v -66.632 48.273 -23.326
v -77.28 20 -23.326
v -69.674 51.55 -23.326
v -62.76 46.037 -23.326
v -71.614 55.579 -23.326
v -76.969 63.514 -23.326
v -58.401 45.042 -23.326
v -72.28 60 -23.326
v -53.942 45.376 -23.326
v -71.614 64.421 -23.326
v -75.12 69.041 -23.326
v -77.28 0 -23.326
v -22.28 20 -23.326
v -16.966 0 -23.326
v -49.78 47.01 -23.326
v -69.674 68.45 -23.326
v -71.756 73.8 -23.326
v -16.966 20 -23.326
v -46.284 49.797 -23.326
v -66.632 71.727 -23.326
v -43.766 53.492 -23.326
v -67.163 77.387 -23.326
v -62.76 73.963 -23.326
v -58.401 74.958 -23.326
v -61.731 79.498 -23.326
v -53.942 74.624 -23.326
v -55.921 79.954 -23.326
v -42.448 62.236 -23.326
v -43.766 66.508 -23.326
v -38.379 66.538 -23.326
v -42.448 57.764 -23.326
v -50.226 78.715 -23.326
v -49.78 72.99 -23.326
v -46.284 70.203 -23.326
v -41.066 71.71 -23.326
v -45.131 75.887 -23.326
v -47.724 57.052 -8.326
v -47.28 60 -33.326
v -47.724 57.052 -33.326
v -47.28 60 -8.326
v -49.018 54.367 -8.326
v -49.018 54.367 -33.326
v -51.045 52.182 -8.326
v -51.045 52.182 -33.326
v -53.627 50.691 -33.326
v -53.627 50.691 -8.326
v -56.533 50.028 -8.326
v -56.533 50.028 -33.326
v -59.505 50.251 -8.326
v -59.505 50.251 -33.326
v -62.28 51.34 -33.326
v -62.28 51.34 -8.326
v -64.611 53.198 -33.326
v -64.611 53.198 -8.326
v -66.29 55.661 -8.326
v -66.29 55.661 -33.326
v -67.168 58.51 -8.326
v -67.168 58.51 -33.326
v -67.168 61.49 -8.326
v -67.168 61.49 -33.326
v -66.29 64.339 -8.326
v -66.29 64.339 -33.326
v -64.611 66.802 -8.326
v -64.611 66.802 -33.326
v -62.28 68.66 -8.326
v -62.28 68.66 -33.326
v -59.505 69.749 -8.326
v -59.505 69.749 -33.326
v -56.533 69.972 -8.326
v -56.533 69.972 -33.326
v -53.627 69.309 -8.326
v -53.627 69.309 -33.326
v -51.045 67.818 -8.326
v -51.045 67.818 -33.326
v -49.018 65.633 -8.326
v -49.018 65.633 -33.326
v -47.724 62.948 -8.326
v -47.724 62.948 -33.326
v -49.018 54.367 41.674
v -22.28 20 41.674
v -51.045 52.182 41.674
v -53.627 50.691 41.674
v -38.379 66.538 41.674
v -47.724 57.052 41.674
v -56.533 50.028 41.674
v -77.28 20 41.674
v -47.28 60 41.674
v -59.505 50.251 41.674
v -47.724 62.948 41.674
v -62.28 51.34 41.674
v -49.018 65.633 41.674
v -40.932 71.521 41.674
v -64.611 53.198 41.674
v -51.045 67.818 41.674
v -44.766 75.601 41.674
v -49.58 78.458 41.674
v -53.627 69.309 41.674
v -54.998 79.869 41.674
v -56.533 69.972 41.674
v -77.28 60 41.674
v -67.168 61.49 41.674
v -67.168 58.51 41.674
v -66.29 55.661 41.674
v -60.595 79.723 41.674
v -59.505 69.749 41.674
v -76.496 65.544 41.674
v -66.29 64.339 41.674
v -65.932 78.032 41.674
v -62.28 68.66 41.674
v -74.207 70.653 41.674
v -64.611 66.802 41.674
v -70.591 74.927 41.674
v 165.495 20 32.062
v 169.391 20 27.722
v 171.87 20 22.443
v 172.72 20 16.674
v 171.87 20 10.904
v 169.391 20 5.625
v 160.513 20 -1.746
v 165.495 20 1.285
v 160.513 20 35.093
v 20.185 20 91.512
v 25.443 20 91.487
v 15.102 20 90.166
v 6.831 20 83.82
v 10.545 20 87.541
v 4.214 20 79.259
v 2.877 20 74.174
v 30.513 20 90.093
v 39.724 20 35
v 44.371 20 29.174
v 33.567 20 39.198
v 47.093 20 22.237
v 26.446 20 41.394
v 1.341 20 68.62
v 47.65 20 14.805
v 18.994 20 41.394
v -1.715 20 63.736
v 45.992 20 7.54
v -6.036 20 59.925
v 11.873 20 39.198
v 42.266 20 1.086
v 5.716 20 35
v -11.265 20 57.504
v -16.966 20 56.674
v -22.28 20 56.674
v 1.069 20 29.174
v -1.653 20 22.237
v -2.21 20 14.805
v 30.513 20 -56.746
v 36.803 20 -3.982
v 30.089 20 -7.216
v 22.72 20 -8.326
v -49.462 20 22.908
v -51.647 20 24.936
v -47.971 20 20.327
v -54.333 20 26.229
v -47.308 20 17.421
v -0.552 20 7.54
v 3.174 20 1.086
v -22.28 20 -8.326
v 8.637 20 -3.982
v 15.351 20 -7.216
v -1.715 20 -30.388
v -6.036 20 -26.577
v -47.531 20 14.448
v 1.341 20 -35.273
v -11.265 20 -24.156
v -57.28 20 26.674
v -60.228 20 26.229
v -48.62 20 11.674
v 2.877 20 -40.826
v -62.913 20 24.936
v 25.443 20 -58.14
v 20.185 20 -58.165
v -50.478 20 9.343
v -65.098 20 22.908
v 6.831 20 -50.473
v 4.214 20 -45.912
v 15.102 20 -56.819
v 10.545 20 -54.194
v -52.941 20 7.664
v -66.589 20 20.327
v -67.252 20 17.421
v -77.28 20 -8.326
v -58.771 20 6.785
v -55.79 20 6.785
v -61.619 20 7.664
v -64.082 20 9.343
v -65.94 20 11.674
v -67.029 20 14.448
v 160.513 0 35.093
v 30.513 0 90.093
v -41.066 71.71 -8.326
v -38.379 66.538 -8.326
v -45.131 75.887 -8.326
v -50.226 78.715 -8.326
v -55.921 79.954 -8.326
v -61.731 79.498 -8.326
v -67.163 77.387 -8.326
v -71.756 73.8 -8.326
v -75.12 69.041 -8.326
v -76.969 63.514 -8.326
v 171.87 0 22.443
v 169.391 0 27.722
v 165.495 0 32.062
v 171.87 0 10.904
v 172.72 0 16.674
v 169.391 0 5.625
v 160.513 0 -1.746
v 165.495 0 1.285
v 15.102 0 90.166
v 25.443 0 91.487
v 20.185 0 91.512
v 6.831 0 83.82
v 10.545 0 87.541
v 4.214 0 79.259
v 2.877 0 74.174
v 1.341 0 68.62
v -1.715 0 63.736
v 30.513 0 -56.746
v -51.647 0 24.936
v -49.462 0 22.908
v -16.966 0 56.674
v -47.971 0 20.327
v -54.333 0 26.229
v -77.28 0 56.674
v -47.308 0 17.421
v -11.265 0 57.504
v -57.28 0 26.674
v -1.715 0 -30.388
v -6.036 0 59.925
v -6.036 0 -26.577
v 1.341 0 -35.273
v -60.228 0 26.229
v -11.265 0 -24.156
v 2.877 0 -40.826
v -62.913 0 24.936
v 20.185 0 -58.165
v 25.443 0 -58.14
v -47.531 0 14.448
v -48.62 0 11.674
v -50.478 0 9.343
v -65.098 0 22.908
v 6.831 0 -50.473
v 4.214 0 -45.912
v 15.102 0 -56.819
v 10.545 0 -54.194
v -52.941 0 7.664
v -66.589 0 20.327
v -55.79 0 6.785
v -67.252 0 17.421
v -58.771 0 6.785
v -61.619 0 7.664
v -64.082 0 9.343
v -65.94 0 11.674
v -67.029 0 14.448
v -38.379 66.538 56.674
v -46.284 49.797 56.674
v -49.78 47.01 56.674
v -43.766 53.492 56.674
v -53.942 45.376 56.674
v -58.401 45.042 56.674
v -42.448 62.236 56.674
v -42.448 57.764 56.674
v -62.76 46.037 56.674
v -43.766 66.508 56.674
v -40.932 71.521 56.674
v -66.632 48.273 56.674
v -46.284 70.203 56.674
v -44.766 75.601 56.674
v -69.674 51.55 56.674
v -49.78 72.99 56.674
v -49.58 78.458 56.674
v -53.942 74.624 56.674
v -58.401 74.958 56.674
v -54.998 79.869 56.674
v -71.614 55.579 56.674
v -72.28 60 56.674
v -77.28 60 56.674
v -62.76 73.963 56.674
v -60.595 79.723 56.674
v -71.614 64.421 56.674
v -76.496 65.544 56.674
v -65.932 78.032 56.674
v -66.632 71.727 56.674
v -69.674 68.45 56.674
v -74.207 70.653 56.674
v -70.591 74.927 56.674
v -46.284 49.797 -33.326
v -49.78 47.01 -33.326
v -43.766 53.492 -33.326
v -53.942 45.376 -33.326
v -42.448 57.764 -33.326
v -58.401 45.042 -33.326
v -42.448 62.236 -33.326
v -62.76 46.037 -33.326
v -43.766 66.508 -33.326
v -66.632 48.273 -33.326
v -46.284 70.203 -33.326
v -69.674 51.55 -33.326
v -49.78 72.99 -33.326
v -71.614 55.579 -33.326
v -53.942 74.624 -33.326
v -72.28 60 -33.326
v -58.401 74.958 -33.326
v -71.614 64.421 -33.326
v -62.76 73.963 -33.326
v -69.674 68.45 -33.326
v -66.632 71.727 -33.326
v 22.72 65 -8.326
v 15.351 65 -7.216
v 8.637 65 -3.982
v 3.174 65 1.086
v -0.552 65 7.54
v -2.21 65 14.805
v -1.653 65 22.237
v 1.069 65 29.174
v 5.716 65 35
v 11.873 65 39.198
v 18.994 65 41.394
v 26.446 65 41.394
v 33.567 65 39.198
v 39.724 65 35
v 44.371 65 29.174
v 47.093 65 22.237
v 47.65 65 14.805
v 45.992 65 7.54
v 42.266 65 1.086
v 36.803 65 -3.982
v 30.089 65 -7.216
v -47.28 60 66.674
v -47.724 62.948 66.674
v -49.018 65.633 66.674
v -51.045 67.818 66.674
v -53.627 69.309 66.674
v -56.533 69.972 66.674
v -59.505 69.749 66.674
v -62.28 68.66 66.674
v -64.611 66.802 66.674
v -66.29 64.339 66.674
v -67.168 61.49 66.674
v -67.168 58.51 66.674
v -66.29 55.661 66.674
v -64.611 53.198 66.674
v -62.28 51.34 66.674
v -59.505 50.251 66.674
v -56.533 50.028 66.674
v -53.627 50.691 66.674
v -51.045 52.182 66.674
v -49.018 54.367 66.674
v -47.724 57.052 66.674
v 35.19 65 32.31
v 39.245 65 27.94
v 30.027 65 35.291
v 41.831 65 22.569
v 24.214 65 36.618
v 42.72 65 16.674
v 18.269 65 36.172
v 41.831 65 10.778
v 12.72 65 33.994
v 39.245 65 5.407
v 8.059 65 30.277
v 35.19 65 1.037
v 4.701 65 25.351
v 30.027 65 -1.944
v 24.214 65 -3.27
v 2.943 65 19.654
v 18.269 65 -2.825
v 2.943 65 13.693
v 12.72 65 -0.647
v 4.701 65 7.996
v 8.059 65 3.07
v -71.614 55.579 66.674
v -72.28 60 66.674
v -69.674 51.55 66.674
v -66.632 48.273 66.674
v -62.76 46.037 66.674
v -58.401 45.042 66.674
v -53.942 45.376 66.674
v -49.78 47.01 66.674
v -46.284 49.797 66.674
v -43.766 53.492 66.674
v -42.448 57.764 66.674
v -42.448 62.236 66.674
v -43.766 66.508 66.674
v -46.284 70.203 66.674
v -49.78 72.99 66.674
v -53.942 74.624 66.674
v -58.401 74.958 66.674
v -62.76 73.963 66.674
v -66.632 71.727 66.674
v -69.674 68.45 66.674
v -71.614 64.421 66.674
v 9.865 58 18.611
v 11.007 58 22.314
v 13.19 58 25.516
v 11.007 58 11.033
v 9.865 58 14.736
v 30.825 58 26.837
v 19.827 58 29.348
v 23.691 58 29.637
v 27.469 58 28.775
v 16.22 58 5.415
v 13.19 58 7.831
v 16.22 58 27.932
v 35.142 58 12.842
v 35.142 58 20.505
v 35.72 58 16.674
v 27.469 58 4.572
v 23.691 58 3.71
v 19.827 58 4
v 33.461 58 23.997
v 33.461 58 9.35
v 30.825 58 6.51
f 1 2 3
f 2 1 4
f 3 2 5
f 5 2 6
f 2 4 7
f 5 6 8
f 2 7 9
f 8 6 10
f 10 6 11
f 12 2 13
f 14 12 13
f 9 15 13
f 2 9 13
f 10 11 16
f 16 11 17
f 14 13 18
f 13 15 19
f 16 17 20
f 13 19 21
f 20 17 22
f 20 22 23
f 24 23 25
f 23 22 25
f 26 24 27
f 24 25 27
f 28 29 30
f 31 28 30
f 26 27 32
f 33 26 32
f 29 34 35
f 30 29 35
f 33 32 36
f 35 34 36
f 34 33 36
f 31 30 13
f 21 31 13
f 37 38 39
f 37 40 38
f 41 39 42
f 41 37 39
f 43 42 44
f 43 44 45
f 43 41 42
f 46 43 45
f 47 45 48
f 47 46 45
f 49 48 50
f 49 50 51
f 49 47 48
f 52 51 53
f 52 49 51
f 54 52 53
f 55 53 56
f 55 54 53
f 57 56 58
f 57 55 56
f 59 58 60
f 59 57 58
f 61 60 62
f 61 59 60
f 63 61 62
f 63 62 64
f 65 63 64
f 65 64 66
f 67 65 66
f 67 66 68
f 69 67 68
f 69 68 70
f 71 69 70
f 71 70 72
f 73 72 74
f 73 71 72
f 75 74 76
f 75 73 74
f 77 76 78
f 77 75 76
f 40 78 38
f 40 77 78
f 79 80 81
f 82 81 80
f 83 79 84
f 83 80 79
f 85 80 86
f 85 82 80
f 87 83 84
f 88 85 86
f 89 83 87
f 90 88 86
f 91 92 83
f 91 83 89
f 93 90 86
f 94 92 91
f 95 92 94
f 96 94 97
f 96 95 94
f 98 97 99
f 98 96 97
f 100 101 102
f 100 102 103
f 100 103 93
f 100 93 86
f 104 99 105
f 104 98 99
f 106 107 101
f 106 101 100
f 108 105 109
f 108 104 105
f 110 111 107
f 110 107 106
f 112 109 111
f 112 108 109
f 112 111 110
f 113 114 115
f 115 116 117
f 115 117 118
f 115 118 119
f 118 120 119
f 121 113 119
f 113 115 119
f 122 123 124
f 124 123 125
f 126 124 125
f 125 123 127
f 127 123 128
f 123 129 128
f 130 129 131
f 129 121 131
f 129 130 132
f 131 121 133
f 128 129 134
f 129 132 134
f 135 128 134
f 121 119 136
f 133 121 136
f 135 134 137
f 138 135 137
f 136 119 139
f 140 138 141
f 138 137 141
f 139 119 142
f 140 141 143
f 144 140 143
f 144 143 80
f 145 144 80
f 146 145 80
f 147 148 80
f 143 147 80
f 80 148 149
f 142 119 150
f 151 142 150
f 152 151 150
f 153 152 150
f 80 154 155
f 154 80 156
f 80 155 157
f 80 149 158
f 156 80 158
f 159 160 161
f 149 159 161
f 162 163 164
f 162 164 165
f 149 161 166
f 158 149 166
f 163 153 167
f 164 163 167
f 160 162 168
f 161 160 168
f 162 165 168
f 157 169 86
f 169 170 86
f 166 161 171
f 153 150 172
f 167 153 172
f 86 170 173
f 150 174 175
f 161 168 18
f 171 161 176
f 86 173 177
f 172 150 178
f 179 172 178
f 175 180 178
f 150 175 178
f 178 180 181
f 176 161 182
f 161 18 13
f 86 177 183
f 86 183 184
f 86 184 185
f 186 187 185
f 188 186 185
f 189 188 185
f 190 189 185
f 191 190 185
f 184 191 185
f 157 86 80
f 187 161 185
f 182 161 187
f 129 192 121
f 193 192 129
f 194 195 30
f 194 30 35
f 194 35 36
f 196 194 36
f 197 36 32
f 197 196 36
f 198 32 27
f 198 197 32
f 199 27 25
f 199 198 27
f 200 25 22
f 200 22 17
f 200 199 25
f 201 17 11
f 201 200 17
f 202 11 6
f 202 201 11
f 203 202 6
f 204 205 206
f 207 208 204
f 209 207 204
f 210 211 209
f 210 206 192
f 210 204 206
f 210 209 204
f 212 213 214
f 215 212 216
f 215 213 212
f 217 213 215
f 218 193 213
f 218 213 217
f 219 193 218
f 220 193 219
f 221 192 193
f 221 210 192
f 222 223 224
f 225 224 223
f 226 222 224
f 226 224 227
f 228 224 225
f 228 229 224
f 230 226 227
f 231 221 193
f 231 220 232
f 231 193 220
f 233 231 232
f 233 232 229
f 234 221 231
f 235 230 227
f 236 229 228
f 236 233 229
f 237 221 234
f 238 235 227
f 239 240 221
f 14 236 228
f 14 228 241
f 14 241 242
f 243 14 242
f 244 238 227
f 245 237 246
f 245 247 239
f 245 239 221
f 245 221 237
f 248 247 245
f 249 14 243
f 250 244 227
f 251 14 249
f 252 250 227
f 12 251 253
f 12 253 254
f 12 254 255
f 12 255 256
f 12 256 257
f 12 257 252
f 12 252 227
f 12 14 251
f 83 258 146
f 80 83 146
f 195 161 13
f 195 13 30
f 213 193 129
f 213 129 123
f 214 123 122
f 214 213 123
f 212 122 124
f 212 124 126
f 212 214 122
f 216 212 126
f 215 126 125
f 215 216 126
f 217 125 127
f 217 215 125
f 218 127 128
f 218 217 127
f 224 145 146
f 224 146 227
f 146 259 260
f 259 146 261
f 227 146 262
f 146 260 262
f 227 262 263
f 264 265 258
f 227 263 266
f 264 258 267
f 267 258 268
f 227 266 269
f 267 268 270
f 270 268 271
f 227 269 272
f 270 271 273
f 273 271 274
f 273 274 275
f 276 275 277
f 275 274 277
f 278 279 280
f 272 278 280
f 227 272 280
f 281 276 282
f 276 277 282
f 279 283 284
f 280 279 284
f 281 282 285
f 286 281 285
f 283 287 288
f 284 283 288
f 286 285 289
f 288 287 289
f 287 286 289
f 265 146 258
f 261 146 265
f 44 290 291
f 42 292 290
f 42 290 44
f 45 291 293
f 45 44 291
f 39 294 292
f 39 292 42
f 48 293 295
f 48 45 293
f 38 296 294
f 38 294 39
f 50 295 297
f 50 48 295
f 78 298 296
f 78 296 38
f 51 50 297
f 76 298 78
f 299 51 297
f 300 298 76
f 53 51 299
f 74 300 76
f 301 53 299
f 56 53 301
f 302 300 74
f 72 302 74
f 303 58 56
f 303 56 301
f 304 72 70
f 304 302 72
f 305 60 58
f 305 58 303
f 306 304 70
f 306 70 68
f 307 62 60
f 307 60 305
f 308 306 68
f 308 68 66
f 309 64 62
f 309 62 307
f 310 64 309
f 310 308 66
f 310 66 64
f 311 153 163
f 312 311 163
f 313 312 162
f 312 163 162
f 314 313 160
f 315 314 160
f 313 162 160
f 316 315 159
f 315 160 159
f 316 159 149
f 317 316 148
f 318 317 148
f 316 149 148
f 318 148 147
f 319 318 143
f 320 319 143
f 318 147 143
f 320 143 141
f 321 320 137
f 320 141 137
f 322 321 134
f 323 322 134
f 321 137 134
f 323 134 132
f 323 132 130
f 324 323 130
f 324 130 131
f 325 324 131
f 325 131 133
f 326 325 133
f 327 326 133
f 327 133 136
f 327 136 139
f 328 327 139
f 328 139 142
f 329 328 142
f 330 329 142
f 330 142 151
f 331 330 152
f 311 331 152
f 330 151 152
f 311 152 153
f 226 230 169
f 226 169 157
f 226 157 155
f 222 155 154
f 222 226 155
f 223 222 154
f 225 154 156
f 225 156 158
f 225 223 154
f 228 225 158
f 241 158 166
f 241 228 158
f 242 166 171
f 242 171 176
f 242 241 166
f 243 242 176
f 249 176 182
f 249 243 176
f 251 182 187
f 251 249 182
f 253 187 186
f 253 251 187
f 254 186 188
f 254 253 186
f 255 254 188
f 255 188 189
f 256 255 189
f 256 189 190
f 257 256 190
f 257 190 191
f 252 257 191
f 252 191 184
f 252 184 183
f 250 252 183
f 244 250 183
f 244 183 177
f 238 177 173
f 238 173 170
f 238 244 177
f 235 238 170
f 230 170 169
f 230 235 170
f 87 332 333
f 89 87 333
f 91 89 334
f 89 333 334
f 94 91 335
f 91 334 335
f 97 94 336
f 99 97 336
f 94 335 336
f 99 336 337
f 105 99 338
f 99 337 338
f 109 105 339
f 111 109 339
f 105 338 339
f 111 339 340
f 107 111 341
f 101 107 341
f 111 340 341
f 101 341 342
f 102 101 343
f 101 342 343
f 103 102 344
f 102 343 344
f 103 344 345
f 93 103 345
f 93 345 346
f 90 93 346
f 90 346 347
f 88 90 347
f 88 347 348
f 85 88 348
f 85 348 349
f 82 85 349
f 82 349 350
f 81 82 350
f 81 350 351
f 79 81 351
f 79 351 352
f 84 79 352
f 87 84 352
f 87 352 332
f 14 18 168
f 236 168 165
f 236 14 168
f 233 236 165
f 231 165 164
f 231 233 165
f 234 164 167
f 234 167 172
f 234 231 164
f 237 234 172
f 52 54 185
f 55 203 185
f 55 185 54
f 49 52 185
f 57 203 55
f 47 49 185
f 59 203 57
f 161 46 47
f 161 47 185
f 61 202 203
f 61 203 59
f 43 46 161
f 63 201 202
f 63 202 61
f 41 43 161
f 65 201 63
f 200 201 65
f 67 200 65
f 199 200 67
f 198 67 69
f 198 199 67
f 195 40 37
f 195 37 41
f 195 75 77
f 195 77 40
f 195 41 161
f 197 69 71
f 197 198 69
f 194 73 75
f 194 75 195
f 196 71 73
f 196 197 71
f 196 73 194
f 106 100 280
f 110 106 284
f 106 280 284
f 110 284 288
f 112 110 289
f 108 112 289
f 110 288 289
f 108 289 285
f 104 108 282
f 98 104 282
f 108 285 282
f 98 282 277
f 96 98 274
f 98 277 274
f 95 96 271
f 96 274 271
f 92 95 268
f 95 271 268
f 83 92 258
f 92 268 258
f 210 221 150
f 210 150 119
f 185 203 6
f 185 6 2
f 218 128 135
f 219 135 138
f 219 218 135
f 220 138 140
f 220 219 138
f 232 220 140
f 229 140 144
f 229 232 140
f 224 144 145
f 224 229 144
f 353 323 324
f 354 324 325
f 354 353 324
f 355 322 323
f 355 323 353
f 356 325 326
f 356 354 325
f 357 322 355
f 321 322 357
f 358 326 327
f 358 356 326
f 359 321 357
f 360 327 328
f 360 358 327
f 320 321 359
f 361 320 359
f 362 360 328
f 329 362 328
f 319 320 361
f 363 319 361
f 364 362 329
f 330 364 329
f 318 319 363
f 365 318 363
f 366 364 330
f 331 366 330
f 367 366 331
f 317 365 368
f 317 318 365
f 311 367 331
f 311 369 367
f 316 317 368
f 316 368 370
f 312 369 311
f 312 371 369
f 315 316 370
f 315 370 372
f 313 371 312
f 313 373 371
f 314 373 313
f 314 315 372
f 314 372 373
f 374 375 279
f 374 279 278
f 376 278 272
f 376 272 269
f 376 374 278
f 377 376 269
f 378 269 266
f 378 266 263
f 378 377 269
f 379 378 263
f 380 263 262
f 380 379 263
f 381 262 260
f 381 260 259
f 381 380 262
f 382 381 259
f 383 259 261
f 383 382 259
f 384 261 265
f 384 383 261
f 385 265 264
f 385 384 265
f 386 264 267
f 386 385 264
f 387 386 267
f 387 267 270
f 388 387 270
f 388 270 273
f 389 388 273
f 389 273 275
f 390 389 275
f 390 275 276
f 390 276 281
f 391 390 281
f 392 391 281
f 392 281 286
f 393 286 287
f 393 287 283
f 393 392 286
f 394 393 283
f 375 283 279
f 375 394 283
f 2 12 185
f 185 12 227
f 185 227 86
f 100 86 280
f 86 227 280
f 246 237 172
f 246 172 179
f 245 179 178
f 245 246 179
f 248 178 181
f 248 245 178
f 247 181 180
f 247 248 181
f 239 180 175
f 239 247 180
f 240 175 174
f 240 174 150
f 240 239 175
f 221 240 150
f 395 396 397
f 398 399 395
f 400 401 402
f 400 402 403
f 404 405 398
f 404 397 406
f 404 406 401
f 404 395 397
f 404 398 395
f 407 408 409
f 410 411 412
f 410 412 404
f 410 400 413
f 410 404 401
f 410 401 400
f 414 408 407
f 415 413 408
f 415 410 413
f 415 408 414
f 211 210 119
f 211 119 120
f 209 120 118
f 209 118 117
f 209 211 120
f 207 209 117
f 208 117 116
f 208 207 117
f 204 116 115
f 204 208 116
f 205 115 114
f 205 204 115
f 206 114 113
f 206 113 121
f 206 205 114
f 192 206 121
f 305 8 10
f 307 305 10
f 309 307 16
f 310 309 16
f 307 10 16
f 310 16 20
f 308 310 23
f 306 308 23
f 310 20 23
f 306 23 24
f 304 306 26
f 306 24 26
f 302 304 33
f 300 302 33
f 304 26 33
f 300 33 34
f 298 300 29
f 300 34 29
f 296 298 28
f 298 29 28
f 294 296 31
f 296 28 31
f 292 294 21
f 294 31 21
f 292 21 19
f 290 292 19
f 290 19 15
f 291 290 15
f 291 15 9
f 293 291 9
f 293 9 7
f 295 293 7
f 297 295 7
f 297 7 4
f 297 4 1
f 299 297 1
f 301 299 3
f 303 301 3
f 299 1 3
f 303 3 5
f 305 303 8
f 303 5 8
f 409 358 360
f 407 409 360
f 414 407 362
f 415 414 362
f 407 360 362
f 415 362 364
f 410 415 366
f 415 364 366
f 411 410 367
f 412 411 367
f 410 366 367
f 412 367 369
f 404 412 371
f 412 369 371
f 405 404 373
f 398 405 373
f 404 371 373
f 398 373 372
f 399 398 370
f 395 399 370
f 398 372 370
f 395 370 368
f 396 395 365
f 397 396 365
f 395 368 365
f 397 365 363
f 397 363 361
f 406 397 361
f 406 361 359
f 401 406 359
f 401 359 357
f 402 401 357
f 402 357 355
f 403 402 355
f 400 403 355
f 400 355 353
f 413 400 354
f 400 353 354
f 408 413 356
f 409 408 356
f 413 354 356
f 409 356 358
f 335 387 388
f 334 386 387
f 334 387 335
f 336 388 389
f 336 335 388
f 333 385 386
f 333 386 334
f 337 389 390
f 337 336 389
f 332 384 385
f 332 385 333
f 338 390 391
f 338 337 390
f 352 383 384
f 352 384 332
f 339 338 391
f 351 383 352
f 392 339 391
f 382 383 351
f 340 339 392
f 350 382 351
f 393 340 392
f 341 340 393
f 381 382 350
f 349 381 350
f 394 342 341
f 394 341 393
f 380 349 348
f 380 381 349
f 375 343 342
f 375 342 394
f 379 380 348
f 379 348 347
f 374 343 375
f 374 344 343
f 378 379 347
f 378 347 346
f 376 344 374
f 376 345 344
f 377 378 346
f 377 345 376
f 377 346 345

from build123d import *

# Parameters (mm, degrees)
SKETCH4_R           = 10
BOSS_EXTRUDE1_DEPTH = 20
SKETCH5_R           = 10
BOSS_EXTRUDE2_DEPTH = 15
BOSS_EXTRUDE4_START = 10
SKETCH6_R           = 15
SKETCH6_R_2         = 10
BOSS_EXTRUDE4_DEPTH = 10
BOSS_EXTRUDE6_START = -15
SKETCH10_R          = 10
BOSS_EXTRUDE6_DEPTH = 15
SKETCH11_R          = 15
SKETCH11_R_2        = 10
BOSS_EXTRUDE7_DEPTH = 10
SKETCH12_R          = 25
BOSS_EXTRUDE8_DEPTH = 45
SKETCH14_R          = 20
CUT_EXTRUDE3_DEPTH  = 7
CUT_EXTRUDE3_DRAFT  = -45


with BuildPart() as part:
    # Sketch4 → Boss-Extrude1 (new body)
    with BuildSketch(Plane(origin=(0, 0, 0), x_dir=(1, 0, 0), z_dir=(0, 1, 0))):
        with BuildLine():
            Line((-77.28011811, -56.673598022), (-77.28011811, 23.326401978))
            Line((-77.28011811, 23.326401978), (-16.966387776, 23.326401978))
            ThreePointArc((-16.966387776, 23.326401978), (-3.737631221, 28.326401978), (2.876747057, 40.826401978))
            ThreePointArc((2.876747057, 40.826401978), (12.736944948, 55.656750215), (30.512681706, 56.745747))
            Line((30.512681706, 56.745747), (160.512681706, 1.745747))
            ThreePointArc((160.512681706, 1.745747), (172.71988189, -16.673598022), (160.512681706, -35.092943043))
            Line((160.512681706, -35.092943043), (30.512681706, -90.092943043))
            ThreePointArc((30.512681706, -90.092943043), (12.736944948, -89.003946259), (2.876747057, -74.173598022))
            ThreePointArc((2.876747057, -74.173598022), (-3.737631221, -61.673598022), (-16.966387776, -56.673598022))
            Line((-16.966387776, -56.673598022), (-77.28011811, -56.673598022))
        make_face()
        with Locations((-57.28011811, -16.673598022)):
            Circle(SKETCH4_R, mode=Mode.SUBTRACT)
    extrude(amount=BOSS_EXTRUDE1_DEPTH)

    # Sketch5 → Boss-Extrude2 (add)
    with BuildSketch(Plane.XY.offset(56.673598022)):
        with BuildLine():
            Line((-77.28011811, 20), (-77.28011811, 60))
            ThreePointArc((-77.28011811, 60), (-60.595178298, 79.723345962), (-38.379080515, 66.538407896))
            Line((-38.379080515, 66.538407896), (-22.28011811, 20))
            Line((-22.28011811, 20), (-77.28011811, 20))
        make_face()
        with Locations((-57.28011811, 60)):
            Circle(SKETCH5_R, mode=Mode.SUBTRACT)
    extrude(amount=-BOSS_EXTRUDE2_DEPTH)

    # Sketch6 → Boss-Extrude4 (add)
    with BuildSketch(Plane.XY.offset(56.673598022).offset(BOSS_EXTRUDE4_START)):
        with Locations((-57.28011811, 60)):
            Circle(SKETCH6_R)
        with Locations((-57.28011811, 60)):
            Circle(SKETCH6_R_2, mode=Mode.SUBTRACT)
    extrude(amount=-BOSS_EXTRUDE4_DEPTH)

    # Sketch10 → Boss-Extrude6 (add)
    with BuildSketch(Plane(origin=(0, 0, -23.326401978), x_dir=(-1, 0, 0), z_dir=(0, 0, -1)).offset(BOSS_EXTRUDE6_START)):
        with BuildLine():
            Line((22.28011811, 20), (38.379080515, 66.538407896))
            ThreePointArc((38.379080515, 66.538407896), (58.842761472, 79.938860191), (76.96898439, 63.514049605))
            Line((76.96898439, 63.514049605), (77.28011811, 20))
            Line((77.28011811, 20), (22.28011811, 20))
        make_face()
        with Locations((57.28011811, 60)):
            Circle(SKETCH10_R, mode=Mode.SUBTRACT)
    extrude(amount=BOSS_EXTRUDE6_DEPTH)

    # Sketch11 → Boss-Extrude7 (add)
    with BuildSketch(Plane(origin=(0, 0, -23.326401978), x_dir=(-1, 0, 0), z_dir=(0, 0, -1))):
        with Locations((57.28011811, 60)):
            Circle(SKETCH11_R)
        with Locations((57.28011811, 60)):
            Circle(SKETCH11_R_2, mode=Mode.SUBTRACT)
    extrude(amount=BOSS_EXTRUDE7_DEPTH)

    # Sketch12 → Boss-Extrude8 (add)
    with BuildSketch(Plane(origin=(0, 20, 0), x_dir=(1, 0, 0), z_dir=(0, 1, 0))):
        with Locations((22.71988189, -16.673598022)):
            Circle(SKETCH12_R)
    extrude(amount=BOSS_EXTRUDE8_DEPTH)


with BuildPart() as cut_extrude3_tool:
    # Sketch14 → Cut-Extrude3 (with draft: the straight prism first)
    with BuildSketch(Plane(origin=(0, 65, 0), x_dir=(1, 0, 0), z_dir=(0, 1, 0))):
        with Locations((22.71988189, -16.673598022)):
            Circle(SKETCH14_R)
    extrude(amount=-CUT_EXTRUDE3_DEPTH)
    # Cut-Extrude3: the draft: its side faces are tilted about the plane it starts from
    cut_extrude3_sides = [cut_extrude3_tool.faces().sort_by_distance(p)[0] for p in [
        (2.71988189, 61.5, 16.673598022),
    ]]
    draft(cut_extrude3_sides, Plane(origin=(0, 65, 0), x_dir=(1, 0, 0), z_dir=(0, 1, 0)), CUT_EXTRUDE3_DRAFT)


with BuildPart() as part_1:
    add(part.part)

    # Cut-Extrude3: cut by cut_extrude3_tool
    add(cut_extrude3_tool.part, mode=Mode.SUBTRACT)


solid = part_1.part
